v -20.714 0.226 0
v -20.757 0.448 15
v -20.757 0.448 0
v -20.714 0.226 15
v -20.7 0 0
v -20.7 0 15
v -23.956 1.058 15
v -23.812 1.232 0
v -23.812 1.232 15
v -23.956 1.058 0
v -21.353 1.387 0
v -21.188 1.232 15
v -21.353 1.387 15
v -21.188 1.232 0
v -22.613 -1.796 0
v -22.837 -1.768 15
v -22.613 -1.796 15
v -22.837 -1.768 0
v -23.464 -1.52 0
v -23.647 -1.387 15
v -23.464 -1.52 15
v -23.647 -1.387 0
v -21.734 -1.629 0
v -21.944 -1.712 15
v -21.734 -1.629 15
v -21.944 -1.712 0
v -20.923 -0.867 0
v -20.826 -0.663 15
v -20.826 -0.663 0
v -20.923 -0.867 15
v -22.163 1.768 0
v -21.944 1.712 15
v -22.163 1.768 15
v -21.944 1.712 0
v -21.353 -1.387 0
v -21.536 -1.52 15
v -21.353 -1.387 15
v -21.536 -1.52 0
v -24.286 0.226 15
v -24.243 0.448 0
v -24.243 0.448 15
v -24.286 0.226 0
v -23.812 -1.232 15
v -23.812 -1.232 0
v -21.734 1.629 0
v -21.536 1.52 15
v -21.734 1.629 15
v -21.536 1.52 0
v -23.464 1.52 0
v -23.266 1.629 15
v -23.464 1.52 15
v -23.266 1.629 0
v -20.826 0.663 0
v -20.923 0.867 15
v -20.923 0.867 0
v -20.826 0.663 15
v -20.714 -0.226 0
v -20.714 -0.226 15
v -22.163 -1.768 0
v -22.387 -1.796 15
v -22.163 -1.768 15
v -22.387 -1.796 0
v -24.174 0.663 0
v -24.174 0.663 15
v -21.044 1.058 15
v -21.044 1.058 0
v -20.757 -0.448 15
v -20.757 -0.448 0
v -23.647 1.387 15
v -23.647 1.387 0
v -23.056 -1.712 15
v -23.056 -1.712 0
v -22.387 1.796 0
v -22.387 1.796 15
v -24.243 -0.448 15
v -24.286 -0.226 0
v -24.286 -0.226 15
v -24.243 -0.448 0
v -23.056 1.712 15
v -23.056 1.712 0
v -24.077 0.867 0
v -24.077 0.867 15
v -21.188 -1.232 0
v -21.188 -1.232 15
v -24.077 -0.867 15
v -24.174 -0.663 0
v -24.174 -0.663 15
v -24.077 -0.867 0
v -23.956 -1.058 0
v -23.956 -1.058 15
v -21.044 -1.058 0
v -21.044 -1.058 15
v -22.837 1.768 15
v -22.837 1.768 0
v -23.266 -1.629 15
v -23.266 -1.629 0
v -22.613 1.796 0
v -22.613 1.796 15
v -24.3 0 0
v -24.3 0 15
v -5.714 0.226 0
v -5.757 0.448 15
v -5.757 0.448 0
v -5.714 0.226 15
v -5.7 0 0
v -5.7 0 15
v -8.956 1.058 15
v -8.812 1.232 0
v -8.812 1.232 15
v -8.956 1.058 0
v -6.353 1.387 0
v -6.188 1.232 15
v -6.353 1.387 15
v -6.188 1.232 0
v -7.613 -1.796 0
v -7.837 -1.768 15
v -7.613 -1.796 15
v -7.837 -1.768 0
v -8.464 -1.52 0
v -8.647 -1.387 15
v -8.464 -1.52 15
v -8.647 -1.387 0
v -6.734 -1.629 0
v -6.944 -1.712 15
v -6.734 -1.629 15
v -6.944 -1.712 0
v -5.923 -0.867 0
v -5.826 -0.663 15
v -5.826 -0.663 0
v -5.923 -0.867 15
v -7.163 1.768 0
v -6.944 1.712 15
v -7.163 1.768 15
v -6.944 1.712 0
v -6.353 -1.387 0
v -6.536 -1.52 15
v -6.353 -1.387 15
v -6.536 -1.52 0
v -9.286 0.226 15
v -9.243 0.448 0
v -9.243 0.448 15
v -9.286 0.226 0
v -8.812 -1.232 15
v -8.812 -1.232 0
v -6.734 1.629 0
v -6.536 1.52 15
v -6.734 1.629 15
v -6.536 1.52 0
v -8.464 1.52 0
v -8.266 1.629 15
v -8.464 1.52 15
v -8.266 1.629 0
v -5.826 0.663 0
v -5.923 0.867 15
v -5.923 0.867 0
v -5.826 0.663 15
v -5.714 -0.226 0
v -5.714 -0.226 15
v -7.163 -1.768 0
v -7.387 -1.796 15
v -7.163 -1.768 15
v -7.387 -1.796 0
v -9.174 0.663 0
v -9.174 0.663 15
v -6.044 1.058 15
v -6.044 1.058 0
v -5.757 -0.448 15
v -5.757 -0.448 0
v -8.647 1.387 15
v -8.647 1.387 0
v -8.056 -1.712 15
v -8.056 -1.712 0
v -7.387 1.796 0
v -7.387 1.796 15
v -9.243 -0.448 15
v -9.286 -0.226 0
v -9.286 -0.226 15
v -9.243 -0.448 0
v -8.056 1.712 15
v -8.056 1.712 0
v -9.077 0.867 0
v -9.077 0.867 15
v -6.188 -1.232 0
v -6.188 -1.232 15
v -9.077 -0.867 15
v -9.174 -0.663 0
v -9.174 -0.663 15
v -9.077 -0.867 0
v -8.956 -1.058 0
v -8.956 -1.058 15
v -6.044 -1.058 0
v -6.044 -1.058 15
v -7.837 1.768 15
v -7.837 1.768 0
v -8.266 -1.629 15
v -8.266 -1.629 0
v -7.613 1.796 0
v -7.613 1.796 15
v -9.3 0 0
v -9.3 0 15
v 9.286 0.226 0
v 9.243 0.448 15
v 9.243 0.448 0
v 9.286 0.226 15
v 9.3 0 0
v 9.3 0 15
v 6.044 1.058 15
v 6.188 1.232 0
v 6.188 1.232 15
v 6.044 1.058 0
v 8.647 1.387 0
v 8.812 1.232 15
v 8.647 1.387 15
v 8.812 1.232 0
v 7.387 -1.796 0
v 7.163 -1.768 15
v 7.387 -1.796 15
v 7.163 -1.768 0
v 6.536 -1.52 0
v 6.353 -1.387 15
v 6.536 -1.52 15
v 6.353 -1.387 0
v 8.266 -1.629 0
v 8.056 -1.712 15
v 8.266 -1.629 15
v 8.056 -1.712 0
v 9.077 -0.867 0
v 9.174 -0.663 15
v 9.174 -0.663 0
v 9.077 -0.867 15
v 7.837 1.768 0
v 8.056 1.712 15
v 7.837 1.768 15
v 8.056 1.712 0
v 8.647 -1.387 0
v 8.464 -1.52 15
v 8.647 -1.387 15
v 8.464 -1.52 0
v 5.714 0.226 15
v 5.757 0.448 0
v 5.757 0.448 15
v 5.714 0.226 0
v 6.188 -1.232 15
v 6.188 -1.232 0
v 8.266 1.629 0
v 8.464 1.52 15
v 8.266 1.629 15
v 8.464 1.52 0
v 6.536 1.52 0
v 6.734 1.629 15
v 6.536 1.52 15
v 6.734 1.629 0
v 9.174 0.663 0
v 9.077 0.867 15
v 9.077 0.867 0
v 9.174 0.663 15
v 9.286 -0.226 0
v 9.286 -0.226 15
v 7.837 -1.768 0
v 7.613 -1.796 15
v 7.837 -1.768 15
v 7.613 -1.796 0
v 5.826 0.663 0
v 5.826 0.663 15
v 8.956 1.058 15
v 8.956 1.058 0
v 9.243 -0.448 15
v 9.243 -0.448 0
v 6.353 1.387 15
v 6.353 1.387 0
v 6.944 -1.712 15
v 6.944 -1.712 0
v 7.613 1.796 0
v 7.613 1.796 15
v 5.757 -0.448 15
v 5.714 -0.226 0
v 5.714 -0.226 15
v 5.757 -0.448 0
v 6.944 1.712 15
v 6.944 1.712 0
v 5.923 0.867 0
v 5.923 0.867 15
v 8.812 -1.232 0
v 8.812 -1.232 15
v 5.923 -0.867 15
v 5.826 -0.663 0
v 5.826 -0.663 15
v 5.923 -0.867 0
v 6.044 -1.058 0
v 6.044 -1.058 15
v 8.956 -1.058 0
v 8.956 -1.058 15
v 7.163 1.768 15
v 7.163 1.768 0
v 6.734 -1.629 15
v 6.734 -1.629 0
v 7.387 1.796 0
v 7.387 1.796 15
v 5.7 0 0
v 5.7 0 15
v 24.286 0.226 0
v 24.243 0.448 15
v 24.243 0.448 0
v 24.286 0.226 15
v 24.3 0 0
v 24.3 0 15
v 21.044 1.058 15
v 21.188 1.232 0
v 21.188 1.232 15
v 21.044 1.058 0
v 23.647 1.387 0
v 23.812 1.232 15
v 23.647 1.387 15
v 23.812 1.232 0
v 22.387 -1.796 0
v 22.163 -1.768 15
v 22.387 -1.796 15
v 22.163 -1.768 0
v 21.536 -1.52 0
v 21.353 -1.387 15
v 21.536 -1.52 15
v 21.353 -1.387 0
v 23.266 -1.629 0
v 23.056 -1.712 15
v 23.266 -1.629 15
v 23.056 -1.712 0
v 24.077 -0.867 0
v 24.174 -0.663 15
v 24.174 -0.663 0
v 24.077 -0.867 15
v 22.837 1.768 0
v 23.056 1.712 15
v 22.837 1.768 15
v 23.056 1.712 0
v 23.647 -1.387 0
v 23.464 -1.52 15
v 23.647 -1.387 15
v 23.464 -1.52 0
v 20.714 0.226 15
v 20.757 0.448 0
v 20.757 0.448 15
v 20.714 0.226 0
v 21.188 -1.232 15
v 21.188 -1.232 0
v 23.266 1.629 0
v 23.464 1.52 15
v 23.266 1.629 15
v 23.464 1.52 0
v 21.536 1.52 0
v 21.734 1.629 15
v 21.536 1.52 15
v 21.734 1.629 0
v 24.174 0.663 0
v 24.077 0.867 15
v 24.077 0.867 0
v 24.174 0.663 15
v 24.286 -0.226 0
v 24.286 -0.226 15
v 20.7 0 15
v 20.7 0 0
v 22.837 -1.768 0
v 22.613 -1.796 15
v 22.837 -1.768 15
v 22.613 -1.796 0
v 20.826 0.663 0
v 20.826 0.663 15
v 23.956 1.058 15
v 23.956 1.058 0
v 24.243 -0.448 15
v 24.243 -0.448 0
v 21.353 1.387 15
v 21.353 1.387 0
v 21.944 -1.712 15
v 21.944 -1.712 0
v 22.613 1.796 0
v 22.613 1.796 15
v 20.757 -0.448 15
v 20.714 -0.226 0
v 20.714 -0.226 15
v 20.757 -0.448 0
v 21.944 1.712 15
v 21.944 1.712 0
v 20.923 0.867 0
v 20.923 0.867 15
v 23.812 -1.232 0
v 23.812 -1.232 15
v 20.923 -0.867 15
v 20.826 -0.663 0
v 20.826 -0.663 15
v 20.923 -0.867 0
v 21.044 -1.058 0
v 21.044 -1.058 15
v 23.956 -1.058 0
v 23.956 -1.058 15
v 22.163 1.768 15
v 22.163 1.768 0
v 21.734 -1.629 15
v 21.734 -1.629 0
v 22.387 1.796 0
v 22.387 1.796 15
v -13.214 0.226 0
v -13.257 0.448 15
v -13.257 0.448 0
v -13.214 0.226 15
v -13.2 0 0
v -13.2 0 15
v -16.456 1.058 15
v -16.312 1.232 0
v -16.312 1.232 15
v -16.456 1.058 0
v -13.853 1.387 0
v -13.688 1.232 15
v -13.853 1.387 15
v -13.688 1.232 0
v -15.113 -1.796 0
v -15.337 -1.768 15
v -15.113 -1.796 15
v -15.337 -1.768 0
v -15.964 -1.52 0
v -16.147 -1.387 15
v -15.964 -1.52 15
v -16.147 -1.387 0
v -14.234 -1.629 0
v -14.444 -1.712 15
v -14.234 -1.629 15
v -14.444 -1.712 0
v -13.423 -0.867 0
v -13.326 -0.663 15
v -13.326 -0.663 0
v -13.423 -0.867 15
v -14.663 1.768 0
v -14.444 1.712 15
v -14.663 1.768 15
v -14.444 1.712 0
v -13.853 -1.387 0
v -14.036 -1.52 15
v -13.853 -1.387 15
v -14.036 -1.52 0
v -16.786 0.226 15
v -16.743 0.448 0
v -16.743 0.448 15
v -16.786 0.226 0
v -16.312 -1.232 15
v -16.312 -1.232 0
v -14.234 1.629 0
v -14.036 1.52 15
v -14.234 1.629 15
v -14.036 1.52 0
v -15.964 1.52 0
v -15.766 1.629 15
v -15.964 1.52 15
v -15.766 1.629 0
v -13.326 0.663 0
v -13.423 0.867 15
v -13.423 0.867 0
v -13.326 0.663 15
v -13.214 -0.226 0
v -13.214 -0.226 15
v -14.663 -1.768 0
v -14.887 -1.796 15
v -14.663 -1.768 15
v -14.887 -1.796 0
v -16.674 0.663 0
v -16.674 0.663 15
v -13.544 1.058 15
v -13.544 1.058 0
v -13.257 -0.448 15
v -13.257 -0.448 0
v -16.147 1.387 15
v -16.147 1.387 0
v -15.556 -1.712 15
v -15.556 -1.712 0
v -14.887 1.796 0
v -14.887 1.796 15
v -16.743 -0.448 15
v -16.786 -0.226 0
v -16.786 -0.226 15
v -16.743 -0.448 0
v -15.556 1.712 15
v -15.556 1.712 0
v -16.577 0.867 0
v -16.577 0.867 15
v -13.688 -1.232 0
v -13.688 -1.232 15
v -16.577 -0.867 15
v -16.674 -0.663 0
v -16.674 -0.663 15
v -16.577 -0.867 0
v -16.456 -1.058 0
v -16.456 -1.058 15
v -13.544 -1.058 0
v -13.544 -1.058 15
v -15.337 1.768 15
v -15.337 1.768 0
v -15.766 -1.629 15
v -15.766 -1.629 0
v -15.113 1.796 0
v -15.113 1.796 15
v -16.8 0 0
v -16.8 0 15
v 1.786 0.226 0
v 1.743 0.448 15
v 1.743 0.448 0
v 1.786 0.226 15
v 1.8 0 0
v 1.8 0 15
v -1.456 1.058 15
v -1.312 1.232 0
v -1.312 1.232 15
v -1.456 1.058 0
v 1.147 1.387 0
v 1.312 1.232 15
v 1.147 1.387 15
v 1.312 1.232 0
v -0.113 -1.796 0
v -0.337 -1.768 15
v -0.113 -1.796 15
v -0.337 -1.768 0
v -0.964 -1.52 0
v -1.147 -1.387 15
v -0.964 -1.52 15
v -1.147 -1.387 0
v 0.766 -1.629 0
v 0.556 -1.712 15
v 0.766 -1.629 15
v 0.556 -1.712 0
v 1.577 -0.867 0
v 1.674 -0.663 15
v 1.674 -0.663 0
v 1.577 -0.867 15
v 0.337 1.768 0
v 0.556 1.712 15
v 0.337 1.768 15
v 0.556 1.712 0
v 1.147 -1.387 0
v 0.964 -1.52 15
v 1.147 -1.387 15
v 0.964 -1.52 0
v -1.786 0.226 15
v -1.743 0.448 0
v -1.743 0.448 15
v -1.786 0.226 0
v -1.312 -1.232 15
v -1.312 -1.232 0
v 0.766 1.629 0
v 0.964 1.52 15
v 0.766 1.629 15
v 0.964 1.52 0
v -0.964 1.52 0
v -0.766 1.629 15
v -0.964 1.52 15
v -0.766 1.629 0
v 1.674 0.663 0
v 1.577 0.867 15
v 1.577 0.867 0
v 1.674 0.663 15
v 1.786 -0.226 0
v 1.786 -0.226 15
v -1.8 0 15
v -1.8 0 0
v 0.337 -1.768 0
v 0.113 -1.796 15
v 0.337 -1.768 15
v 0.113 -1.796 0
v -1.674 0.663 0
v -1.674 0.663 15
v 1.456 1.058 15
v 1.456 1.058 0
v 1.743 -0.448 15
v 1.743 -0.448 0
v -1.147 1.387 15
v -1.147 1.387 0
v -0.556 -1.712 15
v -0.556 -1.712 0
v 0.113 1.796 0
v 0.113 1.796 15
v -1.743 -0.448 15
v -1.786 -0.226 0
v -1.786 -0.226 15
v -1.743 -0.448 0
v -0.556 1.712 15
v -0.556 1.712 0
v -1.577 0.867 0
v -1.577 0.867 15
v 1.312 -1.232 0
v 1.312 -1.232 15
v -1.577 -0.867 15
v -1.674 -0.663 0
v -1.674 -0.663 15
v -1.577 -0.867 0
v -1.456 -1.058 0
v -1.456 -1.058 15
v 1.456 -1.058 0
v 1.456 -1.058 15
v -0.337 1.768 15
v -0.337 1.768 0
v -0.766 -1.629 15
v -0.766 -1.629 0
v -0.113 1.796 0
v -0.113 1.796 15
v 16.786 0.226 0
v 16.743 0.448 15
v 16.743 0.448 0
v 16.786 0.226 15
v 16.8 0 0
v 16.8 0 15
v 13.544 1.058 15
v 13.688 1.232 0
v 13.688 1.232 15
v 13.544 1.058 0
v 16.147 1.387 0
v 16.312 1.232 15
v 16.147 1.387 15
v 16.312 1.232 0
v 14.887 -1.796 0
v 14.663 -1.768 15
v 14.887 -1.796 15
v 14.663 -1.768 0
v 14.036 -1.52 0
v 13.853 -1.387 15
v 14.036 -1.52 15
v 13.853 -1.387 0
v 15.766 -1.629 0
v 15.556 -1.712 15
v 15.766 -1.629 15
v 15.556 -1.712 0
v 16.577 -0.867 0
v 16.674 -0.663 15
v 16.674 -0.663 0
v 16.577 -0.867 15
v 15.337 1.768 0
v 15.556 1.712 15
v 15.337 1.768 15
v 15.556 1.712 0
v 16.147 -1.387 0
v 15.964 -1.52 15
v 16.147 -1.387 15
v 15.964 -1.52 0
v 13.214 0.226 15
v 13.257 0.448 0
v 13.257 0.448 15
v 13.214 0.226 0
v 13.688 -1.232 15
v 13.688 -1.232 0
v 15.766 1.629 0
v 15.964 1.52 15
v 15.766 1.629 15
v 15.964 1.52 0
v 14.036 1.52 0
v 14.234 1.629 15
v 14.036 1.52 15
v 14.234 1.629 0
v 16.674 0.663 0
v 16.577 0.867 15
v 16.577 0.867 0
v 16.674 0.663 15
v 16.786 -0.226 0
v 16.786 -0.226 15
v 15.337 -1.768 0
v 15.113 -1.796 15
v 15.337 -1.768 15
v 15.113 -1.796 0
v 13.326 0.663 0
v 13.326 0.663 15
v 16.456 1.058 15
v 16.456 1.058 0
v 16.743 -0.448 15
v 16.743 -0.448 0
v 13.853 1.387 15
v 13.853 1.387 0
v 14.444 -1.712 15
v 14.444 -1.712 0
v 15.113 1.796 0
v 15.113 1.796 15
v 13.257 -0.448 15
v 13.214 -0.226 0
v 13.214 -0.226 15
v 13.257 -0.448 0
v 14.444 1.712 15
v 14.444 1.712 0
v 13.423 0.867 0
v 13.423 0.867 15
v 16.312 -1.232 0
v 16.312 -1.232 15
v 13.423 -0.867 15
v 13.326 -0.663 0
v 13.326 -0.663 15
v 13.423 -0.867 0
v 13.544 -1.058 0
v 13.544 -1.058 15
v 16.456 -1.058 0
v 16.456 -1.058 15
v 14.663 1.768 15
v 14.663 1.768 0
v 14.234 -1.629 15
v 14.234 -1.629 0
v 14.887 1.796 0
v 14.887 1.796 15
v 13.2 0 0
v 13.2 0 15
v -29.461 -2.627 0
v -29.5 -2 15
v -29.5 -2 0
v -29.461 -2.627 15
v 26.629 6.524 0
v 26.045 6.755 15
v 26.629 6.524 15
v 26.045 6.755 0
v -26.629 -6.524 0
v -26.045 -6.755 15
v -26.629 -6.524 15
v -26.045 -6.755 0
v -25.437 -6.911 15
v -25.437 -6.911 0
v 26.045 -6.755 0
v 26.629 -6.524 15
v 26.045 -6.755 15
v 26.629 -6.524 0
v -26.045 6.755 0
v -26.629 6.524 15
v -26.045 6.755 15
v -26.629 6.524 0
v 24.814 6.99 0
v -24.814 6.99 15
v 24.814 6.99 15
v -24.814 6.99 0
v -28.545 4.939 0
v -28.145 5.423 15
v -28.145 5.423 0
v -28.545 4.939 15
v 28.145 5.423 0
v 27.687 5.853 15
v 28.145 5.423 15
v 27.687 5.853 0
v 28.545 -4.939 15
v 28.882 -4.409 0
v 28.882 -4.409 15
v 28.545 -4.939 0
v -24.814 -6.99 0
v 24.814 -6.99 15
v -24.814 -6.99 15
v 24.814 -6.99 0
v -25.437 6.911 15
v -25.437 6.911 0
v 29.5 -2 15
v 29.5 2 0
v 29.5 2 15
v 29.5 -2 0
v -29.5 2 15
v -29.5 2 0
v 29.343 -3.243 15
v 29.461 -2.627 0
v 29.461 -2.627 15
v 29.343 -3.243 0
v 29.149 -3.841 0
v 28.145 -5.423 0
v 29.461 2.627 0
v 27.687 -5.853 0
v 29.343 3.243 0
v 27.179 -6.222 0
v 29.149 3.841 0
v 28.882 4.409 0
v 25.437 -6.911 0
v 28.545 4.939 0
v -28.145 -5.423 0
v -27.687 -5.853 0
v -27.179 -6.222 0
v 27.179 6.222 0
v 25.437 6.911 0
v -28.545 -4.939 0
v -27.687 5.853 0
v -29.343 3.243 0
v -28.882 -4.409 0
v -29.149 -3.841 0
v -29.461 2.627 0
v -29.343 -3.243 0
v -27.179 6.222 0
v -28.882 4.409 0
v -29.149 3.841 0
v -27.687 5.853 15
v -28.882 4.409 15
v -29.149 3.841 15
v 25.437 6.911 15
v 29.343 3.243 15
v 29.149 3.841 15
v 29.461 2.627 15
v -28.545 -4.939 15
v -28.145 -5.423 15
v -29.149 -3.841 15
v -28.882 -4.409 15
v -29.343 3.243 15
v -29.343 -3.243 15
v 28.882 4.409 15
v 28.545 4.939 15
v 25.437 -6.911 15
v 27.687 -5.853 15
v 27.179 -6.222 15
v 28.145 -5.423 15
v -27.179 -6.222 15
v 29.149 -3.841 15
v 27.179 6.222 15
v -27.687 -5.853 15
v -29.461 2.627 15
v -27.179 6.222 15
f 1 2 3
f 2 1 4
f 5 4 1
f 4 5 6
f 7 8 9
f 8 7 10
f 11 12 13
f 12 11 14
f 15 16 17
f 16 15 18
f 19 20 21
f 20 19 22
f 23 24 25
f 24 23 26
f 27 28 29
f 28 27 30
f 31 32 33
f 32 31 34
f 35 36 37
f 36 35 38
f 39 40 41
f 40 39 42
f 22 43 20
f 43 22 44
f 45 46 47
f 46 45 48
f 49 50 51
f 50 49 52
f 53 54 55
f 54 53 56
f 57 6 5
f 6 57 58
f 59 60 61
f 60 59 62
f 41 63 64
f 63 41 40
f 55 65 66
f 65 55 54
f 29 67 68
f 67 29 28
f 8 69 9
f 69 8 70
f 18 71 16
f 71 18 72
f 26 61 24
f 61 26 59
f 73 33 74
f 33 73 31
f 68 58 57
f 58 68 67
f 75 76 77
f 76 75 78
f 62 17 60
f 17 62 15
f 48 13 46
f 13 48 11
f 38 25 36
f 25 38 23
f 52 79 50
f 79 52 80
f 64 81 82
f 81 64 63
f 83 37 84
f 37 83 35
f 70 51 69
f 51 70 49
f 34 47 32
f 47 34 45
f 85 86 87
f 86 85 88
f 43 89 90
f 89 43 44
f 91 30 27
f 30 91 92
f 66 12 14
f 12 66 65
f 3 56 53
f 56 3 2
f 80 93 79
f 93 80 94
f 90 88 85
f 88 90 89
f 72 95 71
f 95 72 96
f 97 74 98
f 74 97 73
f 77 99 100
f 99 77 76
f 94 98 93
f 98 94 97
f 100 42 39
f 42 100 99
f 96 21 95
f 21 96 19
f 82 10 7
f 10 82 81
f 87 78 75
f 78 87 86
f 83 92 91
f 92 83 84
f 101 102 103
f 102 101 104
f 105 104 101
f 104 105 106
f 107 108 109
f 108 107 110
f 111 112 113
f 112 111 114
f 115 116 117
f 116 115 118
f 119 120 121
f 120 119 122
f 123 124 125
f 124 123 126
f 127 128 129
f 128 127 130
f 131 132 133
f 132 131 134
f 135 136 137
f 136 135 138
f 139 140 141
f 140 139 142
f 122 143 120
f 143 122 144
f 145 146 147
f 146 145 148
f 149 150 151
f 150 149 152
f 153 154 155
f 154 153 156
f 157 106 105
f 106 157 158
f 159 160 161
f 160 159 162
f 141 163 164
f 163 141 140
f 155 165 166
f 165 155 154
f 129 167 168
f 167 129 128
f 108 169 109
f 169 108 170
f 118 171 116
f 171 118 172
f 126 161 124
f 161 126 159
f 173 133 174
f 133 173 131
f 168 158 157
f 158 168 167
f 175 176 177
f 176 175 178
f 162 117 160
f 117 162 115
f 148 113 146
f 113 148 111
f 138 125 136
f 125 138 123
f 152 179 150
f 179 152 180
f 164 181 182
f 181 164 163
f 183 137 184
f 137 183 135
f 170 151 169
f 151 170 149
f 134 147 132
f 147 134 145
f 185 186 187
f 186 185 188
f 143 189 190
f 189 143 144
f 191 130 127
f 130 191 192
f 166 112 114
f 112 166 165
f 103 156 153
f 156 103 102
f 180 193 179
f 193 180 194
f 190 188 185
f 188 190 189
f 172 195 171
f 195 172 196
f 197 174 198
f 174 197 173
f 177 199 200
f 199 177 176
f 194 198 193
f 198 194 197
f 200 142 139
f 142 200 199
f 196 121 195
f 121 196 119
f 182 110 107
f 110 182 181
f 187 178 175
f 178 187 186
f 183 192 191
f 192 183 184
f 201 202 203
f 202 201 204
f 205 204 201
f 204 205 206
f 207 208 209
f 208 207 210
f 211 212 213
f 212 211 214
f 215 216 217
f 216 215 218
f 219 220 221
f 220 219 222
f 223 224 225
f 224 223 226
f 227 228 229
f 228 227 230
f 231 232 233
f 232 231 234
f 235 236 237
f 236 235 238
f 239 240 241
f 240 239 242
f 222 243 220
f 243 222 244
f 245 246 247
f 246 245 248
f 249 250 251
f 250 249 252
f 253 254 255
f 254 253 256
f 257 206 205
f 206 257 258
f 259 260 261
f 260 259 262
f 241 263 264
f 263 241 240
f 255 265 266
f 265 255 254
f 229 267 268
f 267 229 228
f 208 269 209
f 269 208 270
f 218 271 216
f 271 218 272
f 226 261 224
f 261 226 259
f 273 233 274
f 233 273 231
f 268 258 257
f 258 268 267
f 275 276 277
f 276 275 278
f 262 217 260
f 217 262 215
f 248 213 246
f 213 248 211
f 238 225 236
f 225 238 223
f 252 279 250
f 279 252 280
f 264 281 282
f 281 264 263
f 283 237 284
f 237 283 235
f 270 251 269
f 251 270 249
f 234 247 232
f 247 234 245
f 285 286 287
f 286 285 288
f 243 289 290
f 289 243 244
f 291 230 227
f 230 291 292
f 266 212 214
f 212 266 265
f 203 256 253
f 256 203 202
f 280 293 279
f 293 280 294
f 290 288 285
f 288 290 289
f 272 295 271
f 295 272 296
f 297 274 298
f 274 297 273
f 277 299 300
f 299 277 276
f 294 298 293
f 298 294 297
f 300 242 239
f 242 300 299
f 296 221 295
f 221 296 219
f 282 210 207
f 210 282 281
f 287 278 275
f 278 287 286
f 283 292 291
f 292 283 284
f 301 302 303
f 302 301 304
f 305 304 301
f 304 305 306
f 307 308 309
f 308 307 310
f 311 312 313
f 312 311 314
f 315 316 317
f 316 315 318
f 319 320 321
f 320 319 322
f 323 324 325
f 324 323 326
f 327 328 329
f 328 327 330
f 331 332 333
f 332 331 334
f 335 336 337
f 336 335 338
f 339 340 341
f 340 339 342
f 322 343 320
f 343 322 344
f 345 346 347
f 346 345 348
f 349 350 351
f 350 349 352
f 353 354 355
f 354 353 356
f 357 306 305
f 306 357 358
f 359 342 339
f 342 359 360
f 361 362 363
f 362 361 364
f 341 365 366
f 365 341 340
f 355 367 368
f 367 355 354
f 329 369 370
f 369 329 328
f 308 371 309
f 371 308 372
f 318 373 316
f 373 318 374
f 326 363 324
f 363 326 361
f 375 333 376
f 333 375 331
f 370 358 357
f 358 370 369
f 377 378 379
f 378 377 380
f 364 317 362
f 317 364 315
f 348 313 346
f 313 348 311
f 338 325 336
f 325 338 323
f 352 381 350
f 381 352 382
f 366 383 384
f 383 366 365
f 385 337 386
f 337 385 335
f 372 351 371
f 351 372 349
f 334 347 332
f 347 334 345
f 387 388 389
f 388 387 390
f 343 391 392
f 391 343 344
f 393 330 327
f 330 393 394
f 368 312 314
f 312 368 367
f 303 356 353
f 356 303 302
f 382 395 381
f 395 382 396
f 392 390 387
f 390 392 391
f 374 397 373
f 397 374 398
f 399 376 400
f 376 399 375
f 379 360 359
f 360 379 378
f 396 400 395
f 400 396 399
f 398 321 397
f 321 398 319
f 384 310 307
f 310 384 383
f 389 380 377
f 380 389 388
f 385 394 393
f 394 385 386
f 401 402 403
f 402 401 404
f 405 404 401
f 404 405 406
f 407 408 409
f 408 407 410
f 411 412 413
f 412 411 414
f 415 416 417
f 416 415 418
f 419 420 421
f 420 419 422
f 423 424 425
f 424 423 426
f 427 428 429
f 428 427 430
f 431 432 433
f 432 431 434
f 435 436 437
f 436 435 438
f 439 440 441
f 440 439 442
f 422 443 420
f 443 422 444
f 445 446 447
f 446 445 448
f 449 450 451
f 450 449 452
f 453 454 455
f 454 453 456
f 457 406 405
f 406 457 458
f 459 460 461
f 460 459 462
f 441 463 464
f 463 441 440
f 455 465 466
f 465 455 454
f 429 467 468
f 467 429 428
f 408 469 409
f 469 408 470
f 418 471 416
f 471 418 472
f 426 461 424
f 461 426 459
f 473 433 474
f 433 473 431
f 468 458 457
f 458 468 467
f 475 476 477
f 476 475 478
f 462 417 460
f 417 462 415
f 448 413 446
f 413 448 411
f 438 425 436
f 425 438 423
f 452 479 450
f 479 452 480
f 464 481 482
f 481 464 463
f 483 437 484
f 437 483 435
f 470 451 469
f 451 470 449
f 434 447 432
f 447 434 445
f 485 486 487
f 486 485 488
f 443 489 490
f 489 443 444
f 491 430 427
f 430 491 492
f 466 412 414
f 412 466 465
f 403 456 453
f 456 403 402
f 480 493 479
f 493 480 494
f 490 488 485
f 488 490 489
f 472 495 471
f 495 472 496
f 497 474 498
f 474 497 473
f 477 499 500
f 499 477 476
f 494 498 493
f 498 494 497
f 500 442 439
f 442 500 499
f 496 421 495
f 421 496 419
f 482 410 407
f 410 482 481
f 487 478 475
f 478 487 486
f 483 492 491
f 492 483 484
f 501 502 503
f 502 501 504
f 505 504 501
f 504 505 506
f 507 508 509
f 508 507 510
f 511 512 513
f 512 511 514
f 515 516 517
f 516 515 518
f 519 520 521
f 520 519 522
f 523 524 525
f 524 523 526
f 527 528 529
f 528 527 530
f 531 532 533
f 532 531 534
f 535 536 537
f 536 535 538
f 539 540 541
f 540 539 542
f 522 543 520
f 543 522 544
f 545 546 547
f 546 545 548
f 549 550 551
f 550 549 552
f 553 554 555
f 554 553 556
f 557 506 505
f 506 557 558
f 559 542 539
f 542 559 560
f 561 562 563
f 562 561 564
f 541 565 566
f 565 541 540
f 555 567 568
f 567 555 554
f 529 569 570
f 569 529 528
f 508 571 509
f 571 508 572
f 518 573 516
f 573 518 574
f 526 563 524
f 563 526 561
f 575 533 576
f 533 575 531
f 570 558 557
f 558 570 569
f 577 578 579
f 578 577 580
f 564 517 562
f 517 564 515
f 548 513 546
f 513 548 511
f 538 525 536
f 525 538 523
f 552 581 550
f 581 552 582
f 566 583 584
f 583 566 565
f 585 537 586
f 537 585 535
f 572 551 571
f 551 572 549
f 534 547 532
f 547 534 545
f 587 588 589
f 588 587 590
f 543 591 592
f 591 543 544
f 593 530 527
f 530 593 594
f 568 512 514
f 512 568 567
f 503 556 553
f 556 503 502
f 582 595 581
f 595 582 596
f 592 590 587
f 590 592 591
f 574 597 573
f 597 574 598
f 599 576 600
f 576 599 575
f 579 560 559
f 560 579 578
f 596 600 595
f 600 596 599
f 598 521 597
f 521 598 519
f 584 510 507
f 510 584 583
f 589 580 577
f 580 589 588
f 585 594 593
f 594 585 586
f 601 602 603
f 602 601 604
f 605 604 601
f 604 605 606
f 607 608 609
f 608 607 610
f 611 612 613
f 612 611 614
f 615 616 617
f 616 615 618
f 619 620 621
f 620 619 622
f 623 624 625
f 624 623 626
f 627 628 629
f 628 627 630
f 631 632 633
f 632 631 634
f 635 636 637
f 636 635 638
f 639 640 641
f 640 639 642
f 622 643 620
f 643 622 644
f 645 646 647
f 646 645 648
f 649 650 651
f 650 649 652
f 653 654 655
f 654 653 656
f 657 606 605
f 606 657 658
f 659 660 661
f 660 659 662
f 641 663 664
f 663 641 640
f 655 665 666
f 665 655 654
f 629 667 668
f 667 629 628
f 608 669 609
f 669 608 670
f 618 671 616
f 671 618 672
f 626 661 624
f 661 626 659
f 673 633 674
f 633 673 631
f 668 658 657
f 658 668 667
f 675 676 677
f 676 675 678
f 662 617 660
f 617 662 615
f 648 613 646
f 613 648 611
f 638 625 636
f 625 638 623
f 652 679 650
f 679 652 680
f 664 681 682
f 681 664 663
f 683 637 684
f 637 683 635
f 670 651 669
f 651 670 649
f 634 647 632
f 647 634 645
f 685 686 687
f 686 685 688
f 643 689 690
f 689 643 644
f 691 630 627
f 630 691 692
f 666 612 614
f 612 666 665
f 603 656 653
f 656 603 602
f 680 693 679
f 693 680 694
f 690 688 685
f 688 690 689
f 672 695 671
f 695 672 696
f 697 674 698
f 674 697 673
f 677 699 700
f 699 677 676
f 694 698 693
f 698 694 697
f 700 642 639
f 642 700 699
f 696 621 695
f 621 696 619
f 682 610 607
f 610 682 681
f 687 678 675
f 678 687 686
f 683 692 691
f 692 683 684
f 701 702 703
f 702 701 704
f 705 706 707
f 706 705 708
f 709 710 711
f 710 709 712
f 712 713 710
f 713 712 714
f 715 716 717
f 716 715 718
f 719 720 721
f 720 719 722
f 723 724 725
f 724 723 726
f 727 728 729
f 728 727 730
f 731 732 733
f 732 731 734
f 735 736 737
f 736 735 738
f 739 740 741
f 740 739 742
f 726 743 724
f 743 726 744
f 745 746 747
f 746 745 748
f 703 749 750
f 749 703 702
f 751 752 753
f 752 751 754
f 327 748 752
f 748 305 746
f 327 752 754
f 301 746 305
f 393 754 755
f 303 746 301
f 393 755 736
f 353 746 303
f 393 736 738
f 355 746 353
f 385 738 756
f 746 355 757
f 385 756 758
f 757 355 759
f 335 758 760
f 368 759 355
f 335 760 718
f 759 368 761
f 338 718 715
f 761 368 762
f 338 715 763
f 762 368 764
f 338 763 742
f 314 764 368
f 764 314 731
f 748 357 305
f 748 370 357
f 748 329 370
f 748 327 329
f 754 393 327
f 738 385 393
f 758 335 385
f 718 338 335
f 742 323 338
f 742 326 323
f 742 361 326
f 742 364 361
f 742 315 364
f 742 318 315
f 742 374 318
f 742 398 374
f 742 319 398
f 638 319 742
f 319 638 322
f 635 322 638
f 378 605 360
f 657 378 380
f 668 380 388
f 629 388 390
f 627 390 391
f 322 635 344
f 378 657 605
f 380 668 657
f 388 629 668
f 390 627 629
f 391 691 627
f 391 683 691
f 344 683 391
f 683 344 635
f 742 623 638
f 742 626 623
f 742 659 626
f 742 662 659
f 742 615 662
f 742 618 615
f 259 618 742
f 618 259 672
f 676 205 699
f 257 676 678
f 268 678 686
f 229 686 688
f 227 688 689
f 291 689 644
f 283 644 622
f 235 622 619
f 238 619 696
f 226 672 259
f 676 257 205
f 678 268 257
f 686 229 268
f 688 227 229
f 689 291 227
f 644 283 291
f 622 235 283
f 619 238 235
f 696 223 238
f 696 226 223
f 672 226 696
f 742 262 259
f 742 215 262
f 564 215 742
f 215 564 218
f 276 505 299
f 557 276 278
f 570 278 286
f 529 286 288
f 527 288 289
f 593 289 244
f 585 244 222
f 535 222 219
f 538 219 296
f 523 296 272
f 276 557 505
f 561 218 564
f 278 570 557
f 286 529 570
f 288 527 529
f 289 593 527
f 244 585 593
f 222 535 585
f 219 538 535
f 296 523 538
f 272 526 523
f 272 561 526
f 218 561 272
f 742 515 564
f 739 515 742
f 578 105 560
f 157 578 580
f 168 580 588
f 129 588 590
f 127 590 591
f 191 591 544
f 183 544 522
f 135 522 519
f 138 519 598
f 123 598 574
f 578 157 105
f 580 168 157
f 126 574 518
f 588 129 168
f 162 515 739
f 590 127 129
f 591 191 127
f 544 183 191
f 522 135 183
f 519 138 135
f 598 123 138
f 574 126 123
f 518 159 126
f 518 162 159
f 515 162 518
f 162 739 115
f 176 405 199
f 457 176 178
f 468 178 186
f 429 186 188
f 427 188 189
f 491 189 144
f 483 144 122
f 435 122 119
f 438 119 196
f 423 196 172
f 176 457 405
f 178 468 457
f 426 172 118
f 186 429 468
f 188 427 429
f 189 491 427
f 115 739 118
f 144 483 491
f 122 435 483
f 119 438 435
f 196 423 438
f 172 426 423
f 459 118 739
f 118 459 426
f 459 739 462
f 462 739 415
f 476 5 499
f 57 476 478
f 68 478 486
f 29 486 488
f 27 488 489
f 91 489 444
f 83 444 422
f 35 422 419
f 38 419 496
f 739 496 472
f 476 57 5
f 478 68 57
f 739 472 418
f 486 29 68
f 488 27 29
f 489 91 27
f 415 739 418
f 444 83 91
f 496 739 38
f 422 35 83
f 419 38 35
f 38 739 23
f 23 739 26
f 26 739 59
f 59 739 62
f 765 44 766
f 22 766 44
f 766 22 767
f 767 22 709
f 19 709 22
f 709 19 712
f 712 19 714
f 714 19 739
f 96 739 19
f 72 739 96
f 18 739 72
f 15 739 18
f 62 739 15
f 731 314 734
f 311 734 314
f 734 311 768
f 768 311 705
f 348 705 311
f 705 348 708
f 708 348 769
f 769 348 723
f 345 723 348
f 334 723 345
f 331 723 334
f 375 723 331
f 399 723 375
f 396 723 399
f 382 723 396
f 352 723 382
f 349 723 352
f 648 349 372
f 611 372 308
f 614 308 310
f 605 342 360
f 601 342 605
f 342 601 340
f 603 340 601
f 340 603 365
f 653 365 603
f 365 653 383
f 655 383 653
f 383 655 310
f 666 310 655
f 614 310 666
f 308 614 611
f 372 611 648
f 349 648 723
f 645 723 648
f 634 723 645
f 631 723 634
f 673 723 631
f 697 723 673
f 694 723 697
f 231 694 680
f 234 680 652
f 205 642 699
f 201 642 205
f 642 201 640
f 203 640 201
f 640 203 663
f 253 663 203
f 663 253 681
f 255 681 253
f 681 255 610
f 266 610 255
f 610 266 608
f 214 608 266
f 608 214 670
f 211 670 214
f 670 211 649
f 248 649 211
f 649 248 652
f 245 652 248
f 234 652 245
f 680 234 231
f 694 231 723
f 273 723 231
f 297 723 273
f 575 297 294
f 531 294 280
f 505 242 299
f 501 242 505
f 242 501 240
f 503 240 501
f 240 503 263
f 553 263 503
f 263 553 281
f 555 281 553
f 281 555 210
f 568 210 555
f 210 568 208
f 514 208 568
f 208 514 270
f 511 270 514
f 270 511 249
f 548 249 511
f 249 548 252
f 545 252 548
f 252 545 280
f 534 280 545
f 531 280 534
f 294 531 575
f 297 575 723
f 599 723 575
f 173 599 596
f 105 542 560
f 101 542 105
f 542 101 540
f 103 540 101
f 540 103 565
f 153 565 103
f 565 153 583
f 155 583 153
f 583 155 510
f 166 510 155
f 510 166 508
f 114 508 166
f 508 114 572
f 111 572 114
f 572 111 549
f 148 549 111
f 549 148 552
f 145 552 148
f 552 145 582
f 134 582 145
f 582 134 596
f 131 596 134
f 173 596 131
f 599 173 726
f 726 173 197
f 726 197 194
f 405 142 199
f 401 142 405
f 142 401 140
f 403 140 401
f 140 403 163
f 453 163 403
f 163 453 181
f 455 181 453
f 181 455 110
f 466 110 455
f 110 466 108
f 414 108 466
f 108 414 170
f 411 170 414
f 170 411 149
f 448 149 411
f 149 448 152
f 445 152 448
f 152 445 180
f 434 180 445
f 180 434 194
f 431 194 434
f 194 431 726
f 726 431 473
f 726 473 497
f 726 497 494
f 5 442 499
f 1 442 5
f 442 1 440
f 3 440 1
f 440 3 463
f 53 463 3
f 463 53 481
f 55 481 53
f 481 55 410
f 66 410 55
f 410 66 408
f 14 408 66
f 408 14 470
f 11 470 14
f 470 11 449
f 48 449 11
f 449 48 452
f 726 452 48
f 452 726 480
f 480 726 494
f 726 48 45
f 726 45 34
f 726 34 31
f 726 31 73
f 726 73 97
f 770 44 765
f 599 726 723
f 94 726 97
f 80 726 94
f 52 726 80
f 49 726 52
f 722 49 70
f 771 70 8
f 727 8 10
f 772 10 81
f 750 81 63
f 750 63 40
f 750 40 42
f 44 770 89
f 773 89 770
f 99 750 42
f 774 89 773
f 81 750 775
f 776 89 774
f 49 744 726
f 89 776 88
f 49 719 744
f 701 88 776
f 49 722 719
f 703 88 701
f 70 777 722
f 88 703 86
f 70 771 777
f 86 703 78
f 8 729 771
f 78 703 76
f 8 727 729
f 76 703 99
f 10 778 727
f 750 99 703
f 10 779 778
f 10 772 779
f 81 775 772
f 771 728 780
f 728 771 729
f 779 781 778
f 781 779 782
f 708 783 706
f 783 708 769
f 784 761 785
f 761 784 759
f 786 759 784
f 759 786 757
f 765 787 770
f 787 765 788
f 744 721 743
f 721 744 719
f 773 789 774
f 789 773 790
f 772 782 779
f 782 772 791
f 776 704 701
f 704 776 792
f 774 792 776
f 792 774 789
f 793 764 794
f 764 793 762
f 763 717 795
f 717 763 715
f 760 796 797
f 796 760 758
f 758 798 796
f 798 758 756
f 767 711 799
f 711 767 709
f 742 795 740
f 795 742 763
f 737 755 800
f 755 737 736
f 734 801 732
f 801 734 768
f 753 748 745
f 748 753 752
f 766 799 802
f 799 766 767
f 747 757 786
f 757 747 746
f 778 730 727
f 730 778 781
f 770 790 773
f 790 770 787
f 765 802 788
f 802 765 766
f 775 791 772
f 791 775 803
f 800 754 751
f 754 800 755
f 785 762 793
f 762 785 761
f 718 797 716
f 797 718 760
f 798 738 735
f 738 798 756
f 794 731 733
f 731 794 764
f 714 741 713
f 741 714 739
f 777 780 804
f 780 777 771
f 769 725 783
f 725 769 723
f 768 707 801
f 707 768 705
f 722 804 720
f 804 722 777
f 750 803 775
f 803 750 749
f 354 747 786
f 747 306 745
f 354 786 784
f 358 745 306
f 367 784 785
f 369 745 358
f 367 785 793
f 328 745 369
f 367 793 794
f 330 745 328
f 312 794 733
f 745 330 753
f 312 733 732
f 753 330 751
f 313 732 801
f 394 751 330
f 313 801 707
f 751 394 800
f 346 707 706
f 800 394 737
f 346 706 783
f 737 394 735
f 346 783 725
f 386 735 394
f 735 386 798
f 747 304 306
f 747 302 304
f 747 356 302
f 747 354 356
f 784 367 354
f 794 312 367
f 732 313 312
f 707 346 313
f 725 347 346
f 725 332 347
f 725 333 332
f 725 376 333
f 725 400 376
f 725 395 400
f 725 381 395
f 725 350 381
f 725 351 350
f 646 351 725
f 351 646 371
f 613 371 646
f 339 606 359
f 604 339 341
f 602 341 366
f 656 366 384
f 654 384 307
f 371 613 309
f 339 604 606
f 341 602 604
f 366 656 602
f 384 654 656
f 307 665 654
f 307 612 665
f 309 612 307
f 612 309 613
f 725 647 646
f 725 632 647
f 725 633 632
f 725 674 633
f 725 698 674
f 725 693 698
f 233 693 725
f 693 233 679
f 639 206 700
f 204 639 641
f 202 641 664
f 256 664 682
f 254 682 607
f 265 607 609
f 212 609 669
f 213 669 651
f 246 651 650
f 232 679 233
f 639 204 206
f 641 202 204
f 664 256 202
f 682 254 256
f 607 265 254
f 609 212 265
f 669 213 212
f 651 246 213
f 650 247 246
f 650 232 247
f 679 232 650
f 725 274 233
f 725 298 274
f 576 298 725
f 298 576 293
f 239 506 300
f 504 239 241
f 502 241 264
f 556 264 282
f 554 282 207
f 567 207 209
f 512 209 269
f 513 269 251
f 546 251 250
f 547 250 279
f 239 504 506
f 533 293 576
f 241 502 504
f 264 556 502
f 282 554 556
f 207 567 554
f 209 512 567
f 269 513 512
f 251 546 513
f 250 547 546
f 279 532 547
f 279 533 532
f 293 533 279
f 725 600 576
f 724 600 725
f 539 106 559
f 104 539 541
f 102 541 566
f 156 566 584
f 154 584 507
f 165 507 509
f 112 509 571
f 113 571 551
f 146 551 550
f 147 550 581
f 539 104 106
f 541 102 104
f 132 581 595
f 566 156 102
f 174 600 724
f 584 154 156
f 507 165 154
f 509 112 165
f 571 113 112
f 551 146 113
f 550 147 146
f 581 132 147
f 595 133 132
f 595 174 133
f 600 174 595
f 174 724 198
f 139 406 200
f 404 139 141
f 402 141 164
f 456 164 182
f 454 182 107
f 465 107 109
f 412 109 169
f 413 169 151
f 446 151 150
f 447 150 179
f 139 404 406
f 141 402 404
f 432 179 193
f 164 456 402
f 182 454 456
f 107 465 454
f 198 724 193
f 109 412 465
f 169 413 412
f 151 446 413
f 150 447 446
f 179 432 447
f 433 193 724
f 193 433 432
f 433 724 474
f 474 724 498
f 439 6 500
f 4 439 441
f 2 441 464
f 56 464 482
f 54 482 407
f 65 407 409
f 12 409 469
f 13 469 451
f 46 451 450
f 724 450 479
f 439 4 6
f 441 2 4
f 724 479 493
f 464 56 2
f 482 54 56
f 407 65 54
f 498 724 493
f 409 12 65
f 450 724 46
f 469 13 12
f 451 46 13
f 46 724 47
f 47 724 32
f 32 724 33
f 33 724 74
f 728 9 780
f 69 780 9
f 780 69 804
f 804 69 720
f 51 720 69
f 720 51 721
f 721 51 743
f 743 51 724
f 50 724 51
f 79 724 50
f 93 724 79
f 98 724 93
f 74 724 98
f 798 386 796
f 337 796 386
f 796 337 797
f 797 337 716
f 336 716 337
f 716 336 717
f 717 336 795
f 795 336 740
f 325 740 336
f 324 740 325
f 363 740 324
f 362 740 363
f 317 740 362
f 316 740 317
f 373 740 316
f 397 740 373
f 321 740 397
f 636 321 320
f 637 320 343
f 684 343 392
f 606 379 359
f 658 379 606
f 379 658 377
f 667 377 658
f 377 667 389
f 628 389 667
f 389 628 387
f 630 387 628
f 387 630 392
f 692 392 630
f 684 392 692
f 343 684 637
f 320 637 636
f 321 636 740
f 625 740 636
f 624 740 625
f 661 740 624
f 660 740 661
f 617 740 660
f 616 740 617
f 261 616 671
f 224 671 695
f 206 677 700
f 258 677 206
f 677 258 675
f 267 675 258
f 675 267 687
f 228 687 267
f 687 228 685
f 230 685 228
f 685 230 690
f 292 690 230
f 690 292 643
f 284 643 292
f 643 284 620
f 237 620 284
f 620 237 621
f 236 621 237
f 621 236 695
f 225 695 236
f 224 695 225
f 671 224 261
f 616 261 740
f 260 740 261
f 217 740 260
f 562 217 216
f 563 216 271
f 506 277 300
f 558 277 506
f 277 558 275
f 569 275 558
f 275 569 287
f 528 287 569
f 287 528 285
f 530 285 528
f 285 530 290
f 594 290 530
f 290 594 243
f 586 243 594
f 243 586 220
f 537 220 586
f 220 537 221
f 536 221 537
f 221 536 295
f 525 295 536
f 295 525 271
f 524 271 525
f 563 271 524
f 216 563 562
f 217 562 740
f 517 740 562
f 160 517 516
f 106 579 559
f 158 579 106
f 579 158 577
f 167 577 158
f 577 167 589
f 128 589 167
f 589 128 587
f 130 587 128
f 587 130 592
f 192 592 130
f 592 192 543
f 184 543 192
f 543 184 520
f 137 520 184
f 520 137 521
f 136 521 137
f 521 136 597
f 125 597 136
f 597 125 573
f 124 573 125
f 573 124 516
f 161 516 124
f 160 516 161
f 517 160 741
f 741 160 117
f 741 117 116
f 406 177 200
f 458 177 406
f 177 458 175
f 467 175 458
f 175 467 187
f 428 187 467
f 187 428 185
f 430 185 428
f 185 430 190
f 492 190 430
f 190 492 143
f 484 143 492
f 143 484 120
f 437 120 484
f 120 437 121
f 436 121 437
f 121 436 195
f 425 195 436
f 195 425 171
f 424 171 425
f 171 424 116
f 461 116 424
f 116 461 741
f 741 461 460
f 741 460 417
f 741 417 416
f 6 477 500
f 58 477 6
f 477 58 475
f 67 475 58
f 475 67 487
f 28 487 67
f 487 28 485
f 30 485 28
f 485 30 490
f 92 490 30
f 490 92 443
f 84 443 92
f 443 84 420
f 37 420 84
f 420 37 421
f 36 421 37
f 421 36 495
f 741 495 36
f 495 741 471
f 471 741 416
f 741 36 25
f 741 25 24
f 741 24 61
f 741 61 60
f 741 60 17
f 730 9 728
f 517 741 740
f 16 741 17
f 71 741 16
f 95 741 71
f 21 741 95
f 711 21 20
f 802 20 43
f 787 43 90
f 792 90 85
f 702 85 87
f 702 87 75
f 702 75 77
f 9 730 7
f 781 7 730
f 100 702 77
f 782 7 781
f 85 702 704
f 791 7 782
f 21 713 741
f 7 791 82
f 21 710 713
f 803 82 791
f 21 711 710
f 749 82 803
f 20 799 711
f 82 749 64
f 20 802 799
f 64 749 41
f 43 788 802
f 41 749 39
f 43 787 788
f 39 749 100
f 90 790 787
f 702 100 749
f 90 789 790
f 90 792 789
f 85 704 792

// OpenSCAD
$fn = 50;


difference() {
	union() {
		hull() {
			translate(v = [-24.5000000000, 2.0000000000, 0]) {
				cylinder(h = 15, r = 5);
			}
			translate(v = [24.5000000000, 2.0000000000, 0]) {
				cylinder(h = 15, r = 5);
			}
			translate(v = [-24.5000000000, -2.0000000000, 0]) {
				cylinder(h = 15, r = 5);
			}
			translate(v = [24.5000000000, -2.0000000000, 0]) {
				cylinder(h = 15, r = 5);
			}
		}
	}
	union() {
		translate(v = [-22.5000000000, 0.0000000000, 0]) {
			translate(v = [0, 0, -100]) {
				cylinder(h = 200, r = 1.8000000000);
			}
		}
		translate(v = [-7.5000000000, 0.0000000000, 0]) {
			translate(v = [0, 0, -100]) {
				cylinder(h = 200, r = 1.8000000000);
			}
		}
		translate(v = [7.5000000000, 0.0000000000, 0]) {
			translate(v = [0, 0, -100]) {
				cylinder(h = 200, r = 1.8000000000);
			}
		}
		translate(v = [22.5000000000, 0.0000000000, 0]) {
			translate(v = [0, 0, -100]) {
				cylinder(h = 200, r = 1.8000000000);
			}
		}
		translate(v = [-22.5000000000, 0.0000000000, 0]) {
			translate(v = [0, 0, -100]) {
				cylinder(h = 200, r = 1.8000000000);
			}
		}
		translate(v = [-15.0000000000, 0.0000000000, 0]) {
			translate(v = [0, 0, -100]) {
				cylinder(h = 200, r = 1.8000000000);
			}
		}
		translate(v = [-7.5000000000, 0.0000000000, 0]) {
			translate(v = [0, 0, -100]) {
				cylinder(h = 200, r = 1.8000000000);
			}
		}
		translate(v = [0, 0, -100]) {
			cylinder(h = 200, r = 1.8000000000);
		}
		translate(v = [7.5000000000, 0.0000000000, 0]) {
			translate(v = [0, 0, -100]) {
				cylinder(h = 200, r = 1.8000000000);
			}
		}
		translate(v = [15.0000000000, 0.0000000000, 0]) {
			translate(v = [0, 0, -100]) {
				cylinder(h = 200, r = 1.8000000000);
			}
		}
		translate(v = [22.5000000000, 0.0000000000, 0]) {
			translate(v = [0, 0, -100]) {
				cylinder(h = 200, r = 1.8000000000);
			}
		}
	}
}
